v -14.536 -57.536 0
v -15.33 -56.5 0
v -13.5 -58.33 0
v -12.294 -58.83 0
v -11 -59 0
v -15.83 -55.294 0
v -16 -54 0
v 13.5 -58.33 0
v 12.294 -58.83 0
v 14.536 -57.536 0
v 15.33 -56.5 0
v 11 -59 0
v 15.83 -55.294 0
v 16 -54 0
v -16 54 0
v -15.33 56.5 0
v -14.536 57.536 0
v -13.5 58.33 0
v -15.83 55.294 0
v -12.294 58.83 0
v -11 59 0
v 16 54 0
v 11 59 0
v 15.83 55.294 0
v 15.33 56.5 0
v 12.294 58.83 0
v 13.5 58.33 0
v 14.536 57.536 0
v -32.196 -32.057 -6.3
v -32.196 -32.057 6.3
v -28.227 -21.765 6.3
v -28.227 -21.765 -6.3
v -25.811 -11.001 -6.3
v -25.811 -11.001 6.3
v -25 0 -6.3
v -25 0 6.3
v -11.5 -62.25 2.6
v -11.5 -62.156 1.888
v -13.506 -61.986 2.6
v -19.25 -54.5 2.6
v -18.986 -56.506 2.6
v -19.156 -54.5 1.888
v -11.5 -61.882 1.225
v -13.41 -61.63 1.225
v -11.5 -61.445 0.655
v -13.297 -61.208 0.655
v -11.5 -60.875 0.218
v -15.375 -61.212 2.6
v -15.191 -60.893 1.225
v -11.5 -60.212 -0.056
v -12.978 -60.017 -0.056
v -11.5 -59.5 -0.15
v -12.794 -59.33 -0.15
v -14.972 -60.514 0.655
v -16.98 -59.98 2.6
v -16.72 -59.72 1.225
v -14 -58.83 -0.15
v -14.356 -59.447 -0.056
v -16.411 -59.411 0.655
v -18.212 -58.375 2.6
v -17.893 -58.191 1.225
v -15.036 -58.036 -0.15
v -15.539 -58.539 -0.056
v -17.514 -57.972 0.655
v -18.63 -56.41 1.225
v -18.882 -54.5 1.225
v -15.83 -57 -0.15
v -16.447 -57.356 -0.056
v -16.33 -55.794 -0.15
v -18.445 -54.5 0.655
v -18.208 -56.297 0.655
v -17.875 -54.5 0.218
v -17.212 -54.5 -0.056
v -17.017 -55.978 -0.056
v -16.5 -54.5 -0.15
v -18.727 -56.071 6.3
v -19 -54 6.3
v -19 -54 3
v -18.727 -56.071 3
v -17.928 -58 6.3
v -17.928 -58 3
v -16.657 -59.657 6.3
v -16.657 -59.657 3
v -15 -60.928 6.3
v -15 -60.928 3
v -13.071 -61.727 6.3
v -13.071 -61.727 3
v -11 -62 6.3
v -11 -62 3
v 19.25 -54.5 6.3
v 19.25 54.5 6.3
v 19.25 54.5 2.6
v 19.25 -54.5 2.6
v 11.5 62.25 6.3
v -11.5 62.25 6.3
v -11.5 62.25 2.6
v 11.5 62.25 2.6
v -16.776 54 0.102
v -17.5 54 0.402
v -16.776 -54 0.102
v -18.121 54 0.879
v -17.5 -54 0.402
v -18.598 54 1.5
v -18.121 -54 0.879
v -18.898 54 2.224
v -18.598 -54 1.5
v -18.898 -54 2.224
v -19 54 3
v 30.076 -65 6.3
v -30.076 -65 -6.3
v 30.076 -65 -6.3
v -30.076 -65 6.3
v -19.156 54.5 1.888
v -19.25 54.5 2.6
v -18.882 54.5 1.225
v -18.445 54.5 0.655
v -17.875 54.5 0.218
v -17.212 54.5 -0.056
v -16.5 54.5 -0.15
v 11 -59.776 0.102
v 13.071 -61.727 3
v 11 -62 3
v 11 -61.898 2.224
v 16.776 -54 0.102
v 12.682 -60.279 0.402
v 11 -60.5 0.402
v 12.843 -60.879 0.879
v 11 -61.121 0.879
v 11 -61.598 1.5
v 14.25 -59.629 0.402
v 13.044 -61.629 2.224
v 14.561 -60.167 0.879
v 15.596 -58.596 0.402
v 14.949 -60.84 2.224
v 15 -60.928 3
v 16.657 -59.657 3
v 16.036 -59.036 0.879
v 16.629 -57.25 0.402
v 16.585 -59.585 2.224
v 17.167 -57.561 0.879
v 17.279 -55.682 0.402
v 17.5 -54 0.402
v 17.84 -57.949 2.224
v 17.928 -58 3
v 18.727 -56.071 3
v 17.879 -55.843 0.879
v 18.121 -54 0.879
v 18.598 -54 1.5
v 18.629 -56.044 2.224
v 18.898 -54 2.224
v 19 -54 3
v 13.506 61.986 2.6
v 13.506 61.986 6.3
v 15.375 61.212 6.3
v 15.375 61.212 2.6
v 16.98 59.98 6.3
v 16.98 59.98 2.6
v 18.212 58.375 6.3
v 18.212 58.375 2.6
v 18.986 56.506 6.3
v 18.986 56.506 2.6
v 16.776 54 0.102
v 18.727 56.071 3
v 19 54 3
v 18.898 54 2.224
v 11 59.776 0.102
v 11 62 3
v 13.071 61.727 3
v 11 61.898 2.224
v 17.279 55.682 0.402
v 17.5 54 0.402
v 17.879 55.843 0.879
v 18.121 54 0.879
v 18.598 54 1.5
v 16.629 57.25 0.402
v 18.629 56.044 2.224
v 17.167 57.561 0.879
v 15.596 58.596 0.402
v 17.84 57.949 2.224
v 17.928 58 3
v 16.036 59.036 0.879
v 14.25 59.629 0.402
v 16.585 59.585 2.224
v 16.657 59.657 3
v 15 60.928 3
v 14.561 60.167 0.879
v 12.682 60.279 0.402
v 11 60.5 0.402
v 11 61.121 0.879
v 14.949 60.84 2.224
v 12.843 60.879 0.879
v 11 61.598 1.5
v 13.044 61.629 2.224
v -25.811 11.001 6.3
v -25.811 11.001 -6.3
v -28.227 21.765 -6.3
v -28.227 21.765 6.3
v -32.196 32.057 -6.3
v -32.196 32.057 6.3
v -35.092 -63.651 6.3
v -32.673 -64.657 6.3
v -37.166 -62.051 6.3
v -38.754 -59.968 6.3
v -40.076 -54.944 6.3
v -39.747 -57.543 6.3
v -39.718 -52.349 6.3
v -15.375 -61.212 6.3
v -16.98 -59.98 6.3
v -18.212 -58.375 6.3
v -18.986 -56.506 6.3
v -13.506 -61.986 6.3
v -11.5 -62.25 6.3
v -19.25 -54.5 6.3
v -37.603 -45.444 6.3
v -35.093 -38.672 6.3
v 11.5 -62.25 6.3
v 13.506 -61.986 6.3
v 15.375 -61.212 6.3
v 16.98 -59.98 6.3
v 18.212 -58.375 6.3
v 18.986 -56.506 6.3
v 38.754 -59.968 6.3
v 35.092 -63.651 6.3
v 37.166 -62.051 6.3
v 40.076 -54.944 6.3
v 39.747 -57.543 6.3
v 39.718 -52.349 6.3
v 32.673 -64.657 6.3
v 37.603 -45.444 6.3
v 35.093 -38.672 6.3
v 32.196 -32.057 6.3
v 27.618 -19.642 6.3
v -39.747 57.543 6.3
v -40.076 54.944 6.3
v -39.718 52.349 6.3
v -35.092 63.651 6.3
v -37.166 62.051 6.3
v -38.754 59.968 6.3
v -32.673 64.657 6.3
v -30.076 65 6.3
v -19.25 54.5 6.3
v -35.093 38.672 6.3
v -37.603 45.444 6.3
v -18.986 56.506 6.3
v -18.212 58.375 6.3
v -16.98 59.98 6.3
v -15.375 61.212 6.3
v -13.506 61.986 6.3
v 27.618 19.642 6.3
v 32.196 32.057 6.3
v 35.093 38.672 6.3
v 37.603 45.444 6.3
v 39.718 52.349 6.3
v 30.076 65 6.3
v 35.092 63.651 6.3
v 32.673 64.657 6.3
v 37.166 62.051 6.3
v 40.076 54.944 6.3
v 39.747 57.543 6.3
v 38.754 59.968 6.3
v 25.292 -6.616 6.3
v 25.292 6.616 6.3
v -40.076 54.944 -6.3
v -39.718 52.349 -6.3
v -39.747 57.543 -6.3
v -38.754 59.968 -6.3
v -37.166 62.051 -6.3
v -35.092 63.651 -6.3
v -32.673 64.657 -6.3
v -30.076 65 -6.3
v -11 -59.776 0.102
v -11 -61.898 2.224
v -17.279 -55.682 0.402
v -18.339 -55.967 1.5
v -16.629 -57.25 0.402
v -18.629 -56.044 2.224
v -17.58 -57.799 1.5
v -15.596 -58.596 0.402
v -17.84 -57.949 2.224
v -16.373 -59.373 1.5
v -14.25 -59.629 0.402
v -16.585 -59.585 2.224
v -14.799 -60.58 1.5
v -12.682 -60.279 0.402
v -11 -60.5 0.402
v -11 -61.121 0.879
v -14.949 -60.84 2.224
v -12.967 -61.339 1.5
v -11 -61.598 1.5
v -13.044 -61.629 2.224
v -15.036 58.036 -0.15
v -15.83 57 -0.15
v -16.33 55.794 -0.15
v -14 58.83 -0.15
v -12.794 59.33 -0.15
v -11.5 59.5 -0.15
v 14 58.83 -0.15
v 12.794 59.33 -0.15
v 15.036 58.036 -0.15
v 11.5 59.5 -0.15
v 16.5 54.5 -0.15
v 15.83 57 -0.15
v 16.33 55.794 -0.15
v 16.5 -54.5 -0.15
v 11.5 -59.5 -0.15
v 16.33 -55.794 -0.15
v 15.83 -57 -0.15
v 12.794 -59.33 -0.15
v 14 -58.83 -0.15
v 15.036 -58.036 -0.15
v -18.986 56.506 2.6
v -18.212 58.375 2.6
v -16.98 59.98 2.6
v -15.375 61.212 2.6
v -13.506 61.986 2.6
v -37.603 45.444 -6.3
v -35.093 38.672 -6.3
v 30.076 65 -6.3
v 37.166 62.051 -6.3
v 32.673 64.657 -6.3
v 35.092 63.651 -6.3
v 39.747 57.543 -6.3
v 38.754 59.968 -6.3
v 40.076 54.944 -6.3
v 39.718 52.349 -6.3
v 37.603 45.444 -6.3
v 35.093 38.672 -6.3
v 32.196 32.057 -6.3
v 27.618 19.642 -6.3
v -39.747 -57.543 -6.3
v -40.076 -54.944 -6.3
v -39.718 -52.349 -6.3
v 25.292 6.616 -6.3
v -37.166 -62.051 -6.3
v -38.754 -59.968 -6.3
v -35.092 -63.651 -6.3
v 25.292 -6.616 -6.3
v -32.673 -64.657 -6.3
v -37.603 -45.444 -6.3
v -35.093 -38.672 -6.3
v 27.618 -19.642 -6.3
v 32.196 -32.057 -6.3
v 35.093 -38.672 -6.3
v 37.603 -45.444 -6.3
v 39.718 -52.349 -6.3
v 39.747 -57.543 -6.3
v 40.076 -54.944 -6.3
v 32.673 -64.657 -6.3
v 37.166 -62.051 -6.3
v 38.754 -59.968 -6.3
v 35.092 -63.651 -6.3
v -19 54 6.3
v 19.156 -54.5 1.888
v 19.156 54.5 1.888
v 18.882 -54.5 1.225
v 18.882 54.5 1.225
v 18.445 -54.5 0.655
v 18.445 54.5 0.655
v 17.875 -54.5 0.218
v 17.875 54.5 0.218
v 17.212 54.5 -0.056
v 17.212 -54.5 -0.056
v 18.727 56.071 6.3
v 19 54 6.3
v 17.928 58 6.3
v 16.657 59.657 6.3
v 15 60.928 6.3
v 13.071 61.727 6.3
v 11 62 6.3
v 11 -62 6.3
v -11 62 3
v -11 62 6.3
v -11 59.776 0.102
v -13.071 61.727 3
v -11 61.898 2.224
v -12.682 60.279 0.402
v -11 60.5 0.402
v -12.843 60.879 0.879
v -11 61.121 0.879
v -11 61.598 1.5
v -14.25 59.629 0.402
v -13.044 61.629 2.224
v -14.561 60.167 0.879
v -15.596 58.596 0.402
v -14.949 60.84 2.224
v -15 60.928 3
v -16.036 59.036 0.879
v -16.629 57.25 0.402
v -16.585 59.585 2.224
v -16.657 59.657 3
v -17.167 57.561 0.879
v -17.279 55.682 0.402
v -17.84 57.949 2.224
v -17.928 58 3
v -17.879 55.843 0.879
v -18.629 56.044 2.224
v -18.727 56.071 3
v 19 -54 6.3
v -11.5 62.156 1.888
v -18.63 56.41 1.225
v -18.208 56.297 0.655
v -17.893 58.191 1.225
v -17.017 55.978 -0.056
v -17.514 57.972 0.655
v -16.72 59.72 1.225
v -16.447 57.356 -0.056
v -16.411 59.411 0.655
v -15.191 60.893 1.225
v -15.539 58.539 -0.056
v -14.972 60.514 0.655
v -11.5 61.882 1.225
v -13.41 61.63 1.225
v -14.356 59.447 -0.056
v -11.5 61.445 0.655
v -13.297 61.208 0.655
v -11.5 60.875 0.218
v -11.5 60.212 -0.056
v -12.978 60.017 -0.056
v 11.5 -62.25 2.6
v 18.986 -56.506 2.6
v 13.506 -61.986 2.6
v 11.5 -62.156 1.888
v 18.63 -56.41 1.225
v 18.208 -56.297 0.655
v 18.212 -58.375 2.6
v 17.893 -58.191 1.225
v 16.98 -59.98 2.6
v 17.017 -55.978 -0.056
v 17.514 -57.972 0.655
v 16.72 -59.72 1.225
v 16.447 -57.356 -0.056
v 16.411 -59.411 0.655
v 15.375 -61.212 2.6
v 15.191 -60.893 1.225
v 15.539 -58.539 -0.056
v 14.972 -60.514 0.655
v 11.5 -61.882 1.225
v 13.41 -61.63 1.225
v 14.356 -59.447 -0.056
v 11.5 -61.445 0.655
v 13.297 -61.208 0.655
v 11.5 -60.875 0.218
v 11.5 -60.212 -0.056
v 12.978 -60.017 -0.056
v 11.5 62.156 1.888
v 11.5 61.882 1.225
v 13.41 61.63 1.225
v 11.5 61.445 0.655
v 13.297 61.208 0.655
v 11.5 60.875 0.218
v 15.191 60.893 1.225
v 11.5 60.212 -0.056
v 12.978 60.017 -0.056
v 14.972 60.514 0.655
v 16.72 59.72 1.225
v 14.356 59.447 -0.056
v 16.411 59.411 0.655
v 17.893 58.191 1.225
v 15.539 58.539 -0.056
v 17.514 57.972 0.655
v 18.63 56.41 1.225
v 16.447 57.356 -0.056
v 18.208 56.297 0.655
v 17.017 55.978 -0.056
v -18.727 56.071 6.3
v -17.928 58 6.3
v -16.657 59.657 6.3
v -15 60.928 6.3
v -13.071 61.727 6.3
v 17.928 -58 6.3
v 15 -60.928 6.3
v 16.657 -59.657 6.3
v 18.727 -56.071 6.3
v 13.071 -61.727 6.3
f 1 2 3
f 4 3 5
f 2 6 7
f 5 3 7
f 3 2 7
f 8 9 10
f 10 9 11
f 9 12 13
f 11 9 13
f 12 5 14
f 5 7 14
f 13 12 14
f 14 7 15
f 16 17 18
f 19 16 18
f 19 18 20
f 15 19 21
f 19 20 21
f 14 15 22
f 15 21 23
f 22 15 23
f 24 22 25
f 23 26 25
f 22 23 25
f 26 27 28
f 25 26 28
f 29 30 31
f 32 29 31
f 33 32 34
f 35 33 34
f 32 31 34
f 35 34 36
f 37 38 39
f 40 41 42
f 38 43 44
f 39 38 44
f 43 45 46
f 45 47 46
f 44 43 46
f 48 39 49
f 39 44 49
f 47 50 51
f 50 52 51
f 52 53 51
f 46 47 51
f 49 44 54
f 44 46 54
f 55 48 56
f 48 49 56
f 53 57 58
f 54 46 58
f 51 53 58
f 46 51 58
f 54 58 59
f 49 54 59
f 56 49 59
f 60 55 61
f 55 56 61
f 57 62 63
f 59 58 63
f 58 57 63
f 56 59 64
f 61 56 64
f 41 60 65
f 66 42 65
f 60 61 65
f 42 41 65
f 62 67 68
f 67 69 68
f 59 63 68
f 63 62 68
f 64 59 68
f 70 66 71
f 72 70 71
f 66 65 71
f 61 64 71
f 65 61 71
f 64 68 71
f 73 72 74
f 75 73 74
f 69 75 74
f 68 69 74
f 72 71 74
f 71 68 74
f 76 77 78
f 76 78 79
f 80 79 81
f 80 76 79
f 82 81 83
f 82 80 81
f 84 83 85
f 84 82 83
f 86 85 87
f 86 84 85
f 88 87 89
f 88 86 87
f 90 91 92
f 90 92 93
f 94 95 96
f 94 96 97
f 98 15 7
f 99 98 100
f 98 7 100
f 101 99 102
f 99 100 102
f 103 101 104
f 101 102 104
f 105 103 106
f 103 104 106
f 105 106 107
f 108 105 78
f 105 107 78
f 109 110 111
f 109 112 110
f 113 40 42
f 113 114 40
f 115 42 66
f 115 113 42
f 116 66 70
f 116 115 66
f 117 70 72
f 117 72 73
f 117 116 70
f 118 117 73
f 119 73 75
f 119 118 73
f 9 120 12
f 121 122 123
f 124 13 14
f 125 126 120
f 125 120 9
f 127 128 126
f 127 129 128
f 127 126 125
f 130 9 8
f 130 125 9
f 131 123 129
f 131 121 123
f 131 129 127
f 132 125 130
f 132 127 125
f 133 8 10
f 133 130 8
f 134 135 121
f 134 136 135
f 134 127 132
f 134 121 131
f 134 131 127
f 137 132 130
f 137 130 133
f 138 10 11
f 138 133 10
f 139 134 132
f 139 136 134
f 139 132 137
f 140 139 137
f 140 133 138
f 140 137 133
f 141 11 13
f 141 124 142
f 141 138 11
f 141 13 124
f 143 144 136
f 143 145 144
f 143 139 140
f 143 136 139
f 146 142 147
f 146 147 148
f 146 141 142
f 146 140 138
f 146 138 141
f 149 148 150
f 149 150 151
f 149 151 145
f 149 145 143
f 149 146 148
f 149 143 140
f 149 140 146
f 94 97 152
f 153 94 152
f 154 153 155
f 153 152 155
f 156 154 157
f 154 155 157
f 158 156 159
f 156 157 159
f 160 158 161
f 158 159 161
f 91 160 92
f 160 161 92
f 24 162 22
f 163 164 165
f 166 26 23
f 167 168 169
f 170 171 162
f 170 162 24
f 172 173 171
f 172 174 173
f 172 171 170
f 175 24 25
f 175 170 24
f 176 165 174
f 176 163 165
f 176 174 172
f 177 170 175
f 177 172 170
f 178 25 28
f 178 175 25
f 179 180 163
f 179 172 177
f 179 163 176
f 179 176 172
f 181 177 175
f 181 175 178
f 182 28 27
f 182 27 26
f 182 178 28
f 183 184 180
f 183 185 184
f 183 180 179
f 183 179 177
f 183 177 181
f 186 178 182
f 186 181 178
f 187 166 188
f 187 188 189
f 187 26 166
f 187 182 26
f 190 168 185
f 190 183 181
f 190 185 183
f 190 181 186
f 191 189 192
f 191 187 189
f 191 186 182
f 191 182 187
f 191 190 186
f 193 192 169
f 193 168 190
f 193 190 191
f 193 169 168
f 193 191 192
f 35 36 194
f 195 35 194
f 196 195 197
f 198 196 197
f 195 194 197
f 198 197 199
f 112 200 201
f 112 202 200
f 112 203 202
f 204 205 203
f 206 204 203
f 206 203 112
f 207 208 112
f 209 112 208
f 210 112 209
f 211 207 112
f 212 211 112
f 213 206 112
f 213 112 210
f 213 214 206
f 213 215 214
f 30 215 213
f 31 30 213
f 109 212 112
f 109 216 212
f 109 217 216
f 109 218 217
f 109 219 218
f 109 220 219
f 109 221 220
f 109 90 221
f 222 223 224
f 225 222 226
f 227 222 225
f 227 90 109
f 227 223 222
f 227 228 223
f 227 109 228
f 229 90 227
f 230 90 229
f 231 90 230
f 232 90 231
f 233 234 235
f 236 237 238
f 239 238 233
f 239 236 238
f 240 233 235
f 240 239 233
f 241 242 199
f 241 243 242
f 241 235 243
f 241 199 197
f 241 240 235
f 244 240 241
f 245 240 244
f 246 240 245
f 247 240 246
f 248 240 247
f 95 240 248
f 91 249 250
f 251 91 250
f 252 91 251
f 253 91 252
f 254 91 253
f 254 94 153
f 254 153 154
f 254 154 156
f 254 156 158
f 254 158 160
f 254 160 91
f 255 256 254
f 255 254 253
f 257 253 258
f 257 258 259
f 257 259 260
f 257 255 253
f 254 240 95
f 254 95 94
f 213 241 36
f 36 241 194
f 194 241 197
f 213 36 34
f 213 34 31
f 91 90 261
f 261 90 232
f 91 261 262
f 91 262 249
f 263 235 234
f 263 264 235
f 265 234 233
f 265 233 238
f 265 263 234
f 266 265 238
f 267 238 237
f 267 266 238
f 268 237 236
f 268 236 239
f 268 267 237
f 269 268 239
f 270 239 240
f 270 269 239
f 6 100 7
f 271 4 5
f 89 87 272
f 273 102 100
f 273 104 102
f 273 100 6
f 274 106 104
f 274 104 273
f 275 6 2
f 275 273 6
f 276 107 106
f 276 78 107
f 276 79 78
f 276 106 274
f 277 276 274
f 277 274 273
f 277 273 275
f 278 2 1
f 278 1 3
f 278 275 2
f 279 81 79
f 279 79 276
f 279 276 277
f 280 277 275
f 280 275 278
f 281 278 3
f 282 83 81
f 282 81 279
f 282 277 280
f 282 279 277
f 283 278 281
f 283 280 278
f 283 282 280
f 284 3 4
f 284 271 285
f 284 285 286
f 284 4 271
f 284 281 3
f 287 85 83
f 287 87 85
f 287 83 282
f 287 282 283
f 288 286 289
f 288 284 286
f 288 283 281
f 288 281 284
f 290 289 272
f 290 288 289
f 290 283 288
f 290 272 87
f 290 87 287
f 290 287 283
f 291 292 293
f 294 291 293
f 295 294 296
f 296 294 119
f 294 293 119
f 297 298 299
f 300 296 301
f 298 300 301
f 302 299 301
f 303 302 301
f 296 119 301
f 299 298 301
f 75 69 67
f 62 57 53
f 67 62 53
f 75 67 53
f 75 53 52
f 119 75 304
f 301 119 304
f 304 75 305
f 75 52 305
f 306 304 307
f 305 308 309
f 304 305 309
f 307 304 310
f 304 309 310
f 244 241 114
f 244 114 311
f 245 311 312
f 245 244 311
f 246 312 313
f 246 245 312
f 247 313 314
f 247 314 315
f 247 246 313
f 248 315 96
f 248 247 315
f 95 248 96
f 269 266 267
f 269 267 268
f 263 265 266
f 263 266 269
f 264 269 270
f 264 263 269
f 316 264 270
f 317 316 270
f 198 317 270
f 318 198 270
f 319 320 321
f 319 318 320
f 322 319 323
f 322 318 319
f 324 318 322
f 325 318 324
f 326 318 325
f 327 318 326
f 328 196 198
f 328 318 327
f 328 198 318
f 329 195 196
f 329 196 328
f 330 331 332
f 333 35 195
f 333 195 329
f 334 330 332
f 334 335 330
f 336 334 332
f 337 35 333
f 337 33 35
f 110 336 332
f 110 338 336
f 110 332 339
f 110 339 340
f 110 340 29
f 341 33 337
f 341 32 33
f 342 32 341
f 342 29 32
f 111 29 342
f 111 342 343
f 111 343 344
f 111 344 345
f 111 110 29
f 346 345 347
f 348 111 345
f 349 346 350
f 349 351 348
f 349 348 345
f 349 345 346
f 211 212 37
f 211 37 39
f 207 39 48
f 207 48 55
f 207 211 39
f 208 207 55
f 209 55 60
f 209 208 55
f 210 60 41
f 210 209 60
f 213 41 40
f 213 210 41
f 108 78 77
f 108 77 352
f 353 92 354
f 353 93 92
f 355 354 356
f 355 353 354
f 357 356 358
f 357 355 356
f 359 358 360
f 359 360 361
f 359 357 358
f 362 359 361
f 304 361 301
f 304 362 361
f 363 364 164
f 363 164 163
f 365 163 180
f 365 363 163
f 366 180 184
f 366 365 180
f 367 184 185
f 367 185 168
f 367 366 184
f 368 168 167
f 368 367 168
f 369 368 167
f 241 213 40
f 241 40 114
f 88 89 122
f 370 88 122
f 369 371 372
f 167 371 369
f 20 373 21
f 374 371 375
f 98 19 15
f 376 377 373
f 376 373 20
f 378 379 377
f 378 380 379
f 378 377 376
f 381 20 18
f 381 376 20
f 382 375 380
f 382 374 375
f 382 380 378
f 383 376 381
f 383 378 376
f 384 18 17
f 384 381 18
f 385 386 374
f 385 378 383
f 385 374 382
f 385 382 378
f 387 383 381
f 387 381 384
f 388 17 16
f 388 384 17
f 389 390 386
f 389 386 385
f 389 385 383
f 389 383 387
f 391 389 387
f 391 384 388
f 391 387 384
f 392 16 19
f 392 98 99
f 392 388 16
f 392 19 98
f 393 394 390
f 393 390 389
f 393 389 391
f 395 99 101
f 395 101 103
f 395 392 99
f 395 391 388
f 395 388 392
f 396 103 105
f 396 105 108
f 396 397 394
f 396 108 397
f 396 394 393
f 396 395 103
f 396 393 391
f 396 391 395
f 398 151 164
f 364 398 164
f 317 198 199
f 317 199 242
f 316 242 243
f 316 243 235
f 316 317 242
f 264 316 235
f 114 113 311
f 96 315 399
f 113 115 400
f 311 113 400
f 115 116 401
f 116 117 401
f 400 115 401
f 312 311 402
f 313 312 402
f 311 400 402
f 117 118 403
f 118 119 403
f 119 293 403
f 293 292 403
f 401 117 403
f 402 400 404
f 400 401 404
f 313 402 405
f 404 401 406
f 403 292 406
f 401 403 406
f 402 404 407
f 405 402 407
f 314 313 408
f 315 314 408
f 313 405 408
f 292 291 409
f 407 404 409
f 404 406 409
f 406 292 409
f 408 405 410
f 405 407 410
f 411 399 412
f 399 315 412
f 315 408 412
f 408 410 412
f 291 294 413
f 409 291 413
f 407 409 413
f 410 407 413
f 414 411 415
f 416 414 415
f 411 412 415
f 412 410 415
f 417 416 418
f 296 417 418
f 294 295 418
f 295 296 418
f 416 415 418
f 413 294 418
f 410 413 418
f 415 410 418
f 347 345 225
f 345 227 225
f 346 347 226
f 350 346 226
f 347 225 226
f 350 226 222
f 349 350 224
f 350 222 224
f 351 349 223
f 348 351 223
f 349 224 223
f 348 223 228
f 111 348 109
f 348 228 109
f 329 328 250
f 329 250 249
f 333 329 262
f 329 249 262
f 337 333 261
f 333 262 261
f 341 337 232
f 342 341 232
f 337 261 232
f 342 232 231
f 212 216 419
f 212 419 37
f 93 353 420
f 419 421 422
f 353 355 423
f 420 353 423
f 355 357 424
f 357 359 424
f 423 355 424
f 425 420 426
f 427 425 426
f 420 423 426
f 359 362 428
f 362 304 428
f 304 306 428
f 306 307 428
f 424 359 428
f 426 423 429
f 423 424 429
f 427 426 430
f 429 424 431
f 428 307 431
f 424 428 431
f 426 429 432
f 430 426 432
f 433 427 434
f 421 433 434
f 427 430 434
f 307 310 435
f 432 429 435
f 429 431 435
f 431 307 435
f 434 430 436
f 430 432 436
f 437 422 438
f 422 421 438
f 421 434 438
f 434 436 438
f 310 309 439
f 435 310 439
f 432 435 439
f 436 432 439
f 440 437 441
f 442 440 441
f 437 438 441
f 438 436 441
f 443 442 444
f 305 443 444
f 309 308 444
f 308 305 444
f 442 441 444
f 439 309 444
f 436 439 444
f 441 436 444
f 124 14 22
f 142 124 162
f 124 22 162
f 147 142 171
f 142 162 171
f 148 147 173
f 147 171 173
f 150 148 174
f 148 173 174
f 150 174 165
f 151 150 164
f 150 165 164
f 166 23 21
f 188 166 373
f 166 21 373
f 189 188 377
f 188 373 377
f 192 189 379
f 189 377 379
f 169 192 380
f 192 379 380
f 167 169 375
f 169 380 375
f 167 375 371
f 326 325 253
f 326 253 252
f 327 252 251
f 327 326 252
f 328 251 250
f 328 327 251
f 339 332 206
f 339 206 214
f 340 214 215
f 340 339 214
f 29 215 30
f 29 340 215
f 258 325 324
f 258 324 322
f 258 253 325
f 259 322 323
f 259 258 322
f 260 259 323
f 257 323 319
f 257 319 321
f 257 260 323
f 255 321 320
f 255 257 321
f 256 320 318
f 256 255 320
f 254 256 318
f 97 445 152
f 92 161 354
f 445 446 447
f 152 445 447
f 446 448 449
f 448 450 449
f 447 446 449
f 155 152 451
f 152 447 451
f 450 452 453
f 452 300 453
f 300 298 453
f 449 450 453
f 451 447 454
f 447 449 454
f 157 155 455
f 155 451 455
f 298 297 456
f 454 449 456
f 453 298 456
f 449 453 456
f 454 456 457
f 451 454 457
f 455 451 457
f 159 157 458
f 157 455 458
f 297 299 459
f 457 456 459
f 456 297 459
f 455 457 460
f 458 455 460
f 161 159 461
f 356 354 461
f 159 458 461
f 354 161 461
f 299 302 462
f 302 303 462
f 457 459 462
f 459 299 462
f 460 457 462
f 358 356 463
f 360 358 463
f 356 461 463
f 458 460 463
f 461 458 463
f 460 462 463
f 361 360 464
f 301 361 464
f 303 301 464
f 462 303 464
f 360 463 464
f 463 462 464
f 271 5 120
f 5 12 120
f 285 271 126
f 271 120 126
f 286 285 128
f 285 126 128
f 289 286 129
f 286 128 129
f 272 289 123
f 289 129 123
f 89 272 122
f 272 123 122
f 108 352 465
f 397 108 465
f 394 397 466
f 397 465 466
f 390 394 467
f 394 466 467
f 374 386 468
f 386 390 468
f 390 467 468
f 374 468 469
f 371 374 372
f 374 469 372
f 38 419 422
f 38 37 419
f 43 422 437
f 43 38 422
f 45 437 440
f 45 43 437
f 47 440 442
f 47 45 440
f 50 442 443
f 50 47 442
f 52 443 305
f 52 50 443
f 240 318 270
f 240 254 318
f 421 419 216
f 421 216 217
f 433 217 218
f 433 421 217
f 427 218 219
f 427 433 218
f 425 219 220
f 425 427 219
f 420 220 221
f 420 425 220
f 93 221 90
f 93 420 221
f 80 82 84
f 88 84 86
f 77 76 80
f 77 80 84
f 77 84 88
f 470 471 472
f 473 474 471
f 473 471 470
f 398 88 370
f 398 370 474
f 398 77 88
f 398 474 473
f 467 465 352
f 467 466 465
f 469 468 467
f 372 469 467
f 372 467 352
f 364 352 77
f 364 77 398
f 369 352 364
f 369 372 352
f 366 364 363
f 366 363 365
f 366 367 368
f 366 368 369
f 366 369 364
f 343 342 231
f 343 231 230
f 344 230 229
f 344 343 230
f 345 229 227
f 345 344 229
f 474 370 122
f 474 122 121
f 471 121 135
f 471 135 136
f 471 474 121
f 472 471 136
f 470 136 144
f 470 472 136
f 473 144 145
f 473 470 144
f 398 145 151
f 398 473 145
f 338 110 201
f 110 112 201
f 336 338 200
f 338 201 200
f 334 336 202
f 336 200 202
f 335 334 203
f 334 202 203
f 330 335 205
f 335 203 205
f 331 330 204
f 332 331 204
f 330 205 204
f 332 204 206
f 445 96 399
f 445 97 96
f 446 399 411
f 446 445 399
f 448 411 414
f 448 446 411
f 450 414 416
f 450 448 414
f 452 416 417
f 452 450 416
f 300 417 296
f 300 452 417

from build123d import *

# Parameters (mm, degrees)
F0_W         = 38
F0_H         = 124
F1_DEPTH     = 6.3
F2_R         = 8
F3_R         = 3
F5_DEPTH     = 6.3
F6_W         = 38.5
F6_H         = 124.5
F7_DEPTH     = 6.15
F8_R         = 7.75
F9_R         = 2.75
F11_DEPTH    = 12.601
F12_T1_DEPTH = 108.1589008266
F13_R        = 10


# Not quite as in the source:
# - a fillet or chamfer that OpenCascade refuses, or shapes differently, is made with other operations: its cross-section is extruded or revolved along the edge and cut away or added


with BuildPart() as f1:
    # F0 (on Top) → F1 (new body)
    with BuildSketch(Plane.XY):
        Rectangle(F0_W, F0_H)
    extrude(amount=F1_DEPTH)

    # F2
    f2_edges = [f1.edges().sort_by_distance(p)[0] for p in [
        (19, 62, 3.15),
        (-19, 62, 3.15),
        (19, -62, 3.15),
        (-19, -62, 3.15),
    ]]
    fillet(f2_edges, radius=F2_R)

    # F3
    f3_edges = [f1.edges().sort_by_distance(p)[0] for p in [
        (0, -62, 0),
        (-16.656854, -59.656854, 0),
        (16.656854, -59.656854, 0),
        (-19, 0, 0),
        (19, 0, 0),
        (-16.656854, 59.656854, 0),
        (16.656854, 59.656854, 0),
        (0, 62, 0),
    ]]
    fillet(f3_edges, radius=F3_R)


with BuildPart() as f5:
    # F4 (on Top) → F5 (new body, symmetric)
    with BuildSketch(Plane.XY):
        with BuildLine():
            Line((19.25, -27.1095328612), (19.25, -62.25))
            Line((19.25, -62.25), (-19.25, -62.25))
            Line((-19.25, -62.25), (-19.25, -27.1095328612))
            ThreePointArc((-19.25, -27.1095328612), (-36.224128699, -42.7724832696), (-42.5, -65))
            Line((-42.5, -65), (42.5, -65))
            ThreePointArc((42.5, -65), (36.224128699, -42.7724832696), (19.25, -27.1095328612))
        make_face()
        with BuildLine():
            ThreePointArc((-42.5, -65), (-36.224128699, -42.7724832696), (-19.25, -27.1095328612))
            Line((-19.25, -27.1095328612), (-19.25, 27.1095328612))
            ThreePointArc((-19.25, 27.1095328612), (-36.224128699, 42.7724832696), (-42.5, 65))
            Line((-42.5, 65), (-42.5, -65))
        make_face()
        with BuildLine():
            Line((19.25, 27.1095328612), (19.25, -27.1095328612))
            ThreePointArc((19.25, -27.1095328612), (36.224128699, -42.7724832696), (42.5, -65))
            Line((42.5, -65), (42.5, 65))
            ThreePointArc((42.5, 65), (36.224128699, 42.7724832696), (19.25, 27.1095328612))
        make_face()
        with BuildLine():
            Line((19.25, 62.25), (19.25, 27.1095328612))
            ThreePointArc((19.25, 27.1095328612), (36.224128699, 42.7724832696), (42.5, 65))
            Line((42.5, 65), (-42.5, 65))
            ThreePointArc((-42.5, 65), (-36.224128699, 42.7724832696), (-19.25, 27.1095328612))
            Line((-19.25, 27.1095328612), (-19.25, 62.25))
            Line((-19.25, 62.25), (19.25, 62.25))
        make_face()
    extrude(amount=F5_DEPTH, both=True)

    # F6 (on face) → F7 (join)
    with BuildSketch(Plane(origin=(0, 0, -6.3), x_dir=(1, 0, 0), z_dir=(0, 0, -1))):
        Rectangle(F6_W, F6_H)
    extrude(amount=-F7_DEPTH)

    # F8
    f8_edges = [f5.edges().sort_by_distance(p)[0] for p in [
        (19.25, -62.25, 3.075),
        (-19.25, -62.25, 3.075),
        (19.25, 62.25, 3.075),
        (-19.25, 62.25, 3.075),
    ]]
    fillet(f8_edges, radius=F8_R)

    # F9
    f9_edges = [f5.edges().sort_by_distance(p)[0] for p in [
        (0, 62.25, -0.15),
        (-16.980078, 59.980078, -0.15),
        (16.980078, 59.980078, -0.15),
        (-19.25, 0, -0.15),
        (19.25, 0, -0.15),
        (-16.980078, -59.980078, -0.15),
        (16.980078, -59.980078, -0.15),
        (0, -62.25, -0.15),
    ]]
    fillet(f9_edges, radius=F9_R)

    # F10 (on face) → F11 (cut, through all)
    with BuildSketch(Plane.XY.offset(6.3)):
        with BuildLine():
            ThreePointArc((-25, 0), (-29.5106391006, 25.6173769149), (-42.5, 48.1534007106))
            Line((-42.5, 48.1534007106), (-42.5, -48.1534007106))
            ThreePointArc((-42.5, -48.1534007106), (-29.5106391006, -25.6173769149), (-25, 0))
        make_face()
        with BuildLine():
            Line((42.5, -48.1534007106), (42.5, 48.1534007106))
            ThreePointArc((42.5, 48.1534007106), (25, 0), (42.5, -48.1534007106))
        make_face()
    extrude(amount=-F11_DEPTH, mode=Mode.SUBTRACT)

    # F12: fillet of radius 125 on 4 edges, made by hand

    # F12_s2 → F12_t1 (cut)
    with BuildSketch(Plane.XY.offset(-54.0794504133)):
        with BuildLine():
            ThreePointArc((32.1962626253, -32.0570303993), (38.4906868537, -48.1711523883), (42.5, -65))
            Line((42.5, -65), (42.5, -48.1534007106))
            ThreePointArc((42.5, -48.1534007106), (36.8333162631, -40.4347630843), (32.1962626253, -32.0570303993))
        make_face()
        with BuildLine():
            ThreePointArc((42.5, 65), (38.4906868537, 48.1711523883), (32.1962626253, 32.0570303993))
            ThreePointArc((32.1962626253, 32.0570303993), (36.8333162631, 40.4347630843), (42.5, 48.1534007106))
            Line((42.5, 48.1534007106), (42.5, 65))
        make_face()
        with BuildLine():
            ThreePointArc((-42.5, -65), (-38.4906868537, -48.1711523883), (-32.1962626253, -32.0570303993))
            ThreePointArc((-32.1962626253, -32.0570303993), (-36.8333162631, -40.4347630843), (-42.5, -48.1534007106))
            Line((-42.5, -48.1534007106), (-42.5, -65))
        make_face()
        with BuildLine():
            ThreePointArc((-32.1962626253, 32.0570303993), (-38.4906868537, 48.1711523883), (-42.5, 65))
            Line((-42.5, 65), (-42.5, 48.1534007106))
            ThreePointArc((-42.5, 48.1534007106), (-36.8333162631, 40.4347630843), (-32.1962626253, 32.0570303993))
        make_face()
    extrude(amount=F12_T1_DEPTH, mode=Mode.SUBTRACT)

    # F13
    f13_edges = [f5.edges().sort_by_distance(p)[0] for p in [
        (-42.5, 65, 0),
        (42.5, 65, 0),
        (-42.5, -65, 0),
        (42.5, -65, 0),
    ]]
    fillet(f13_edges, radius=F13_R)


solid = Compound([f1.part, f5.part])
